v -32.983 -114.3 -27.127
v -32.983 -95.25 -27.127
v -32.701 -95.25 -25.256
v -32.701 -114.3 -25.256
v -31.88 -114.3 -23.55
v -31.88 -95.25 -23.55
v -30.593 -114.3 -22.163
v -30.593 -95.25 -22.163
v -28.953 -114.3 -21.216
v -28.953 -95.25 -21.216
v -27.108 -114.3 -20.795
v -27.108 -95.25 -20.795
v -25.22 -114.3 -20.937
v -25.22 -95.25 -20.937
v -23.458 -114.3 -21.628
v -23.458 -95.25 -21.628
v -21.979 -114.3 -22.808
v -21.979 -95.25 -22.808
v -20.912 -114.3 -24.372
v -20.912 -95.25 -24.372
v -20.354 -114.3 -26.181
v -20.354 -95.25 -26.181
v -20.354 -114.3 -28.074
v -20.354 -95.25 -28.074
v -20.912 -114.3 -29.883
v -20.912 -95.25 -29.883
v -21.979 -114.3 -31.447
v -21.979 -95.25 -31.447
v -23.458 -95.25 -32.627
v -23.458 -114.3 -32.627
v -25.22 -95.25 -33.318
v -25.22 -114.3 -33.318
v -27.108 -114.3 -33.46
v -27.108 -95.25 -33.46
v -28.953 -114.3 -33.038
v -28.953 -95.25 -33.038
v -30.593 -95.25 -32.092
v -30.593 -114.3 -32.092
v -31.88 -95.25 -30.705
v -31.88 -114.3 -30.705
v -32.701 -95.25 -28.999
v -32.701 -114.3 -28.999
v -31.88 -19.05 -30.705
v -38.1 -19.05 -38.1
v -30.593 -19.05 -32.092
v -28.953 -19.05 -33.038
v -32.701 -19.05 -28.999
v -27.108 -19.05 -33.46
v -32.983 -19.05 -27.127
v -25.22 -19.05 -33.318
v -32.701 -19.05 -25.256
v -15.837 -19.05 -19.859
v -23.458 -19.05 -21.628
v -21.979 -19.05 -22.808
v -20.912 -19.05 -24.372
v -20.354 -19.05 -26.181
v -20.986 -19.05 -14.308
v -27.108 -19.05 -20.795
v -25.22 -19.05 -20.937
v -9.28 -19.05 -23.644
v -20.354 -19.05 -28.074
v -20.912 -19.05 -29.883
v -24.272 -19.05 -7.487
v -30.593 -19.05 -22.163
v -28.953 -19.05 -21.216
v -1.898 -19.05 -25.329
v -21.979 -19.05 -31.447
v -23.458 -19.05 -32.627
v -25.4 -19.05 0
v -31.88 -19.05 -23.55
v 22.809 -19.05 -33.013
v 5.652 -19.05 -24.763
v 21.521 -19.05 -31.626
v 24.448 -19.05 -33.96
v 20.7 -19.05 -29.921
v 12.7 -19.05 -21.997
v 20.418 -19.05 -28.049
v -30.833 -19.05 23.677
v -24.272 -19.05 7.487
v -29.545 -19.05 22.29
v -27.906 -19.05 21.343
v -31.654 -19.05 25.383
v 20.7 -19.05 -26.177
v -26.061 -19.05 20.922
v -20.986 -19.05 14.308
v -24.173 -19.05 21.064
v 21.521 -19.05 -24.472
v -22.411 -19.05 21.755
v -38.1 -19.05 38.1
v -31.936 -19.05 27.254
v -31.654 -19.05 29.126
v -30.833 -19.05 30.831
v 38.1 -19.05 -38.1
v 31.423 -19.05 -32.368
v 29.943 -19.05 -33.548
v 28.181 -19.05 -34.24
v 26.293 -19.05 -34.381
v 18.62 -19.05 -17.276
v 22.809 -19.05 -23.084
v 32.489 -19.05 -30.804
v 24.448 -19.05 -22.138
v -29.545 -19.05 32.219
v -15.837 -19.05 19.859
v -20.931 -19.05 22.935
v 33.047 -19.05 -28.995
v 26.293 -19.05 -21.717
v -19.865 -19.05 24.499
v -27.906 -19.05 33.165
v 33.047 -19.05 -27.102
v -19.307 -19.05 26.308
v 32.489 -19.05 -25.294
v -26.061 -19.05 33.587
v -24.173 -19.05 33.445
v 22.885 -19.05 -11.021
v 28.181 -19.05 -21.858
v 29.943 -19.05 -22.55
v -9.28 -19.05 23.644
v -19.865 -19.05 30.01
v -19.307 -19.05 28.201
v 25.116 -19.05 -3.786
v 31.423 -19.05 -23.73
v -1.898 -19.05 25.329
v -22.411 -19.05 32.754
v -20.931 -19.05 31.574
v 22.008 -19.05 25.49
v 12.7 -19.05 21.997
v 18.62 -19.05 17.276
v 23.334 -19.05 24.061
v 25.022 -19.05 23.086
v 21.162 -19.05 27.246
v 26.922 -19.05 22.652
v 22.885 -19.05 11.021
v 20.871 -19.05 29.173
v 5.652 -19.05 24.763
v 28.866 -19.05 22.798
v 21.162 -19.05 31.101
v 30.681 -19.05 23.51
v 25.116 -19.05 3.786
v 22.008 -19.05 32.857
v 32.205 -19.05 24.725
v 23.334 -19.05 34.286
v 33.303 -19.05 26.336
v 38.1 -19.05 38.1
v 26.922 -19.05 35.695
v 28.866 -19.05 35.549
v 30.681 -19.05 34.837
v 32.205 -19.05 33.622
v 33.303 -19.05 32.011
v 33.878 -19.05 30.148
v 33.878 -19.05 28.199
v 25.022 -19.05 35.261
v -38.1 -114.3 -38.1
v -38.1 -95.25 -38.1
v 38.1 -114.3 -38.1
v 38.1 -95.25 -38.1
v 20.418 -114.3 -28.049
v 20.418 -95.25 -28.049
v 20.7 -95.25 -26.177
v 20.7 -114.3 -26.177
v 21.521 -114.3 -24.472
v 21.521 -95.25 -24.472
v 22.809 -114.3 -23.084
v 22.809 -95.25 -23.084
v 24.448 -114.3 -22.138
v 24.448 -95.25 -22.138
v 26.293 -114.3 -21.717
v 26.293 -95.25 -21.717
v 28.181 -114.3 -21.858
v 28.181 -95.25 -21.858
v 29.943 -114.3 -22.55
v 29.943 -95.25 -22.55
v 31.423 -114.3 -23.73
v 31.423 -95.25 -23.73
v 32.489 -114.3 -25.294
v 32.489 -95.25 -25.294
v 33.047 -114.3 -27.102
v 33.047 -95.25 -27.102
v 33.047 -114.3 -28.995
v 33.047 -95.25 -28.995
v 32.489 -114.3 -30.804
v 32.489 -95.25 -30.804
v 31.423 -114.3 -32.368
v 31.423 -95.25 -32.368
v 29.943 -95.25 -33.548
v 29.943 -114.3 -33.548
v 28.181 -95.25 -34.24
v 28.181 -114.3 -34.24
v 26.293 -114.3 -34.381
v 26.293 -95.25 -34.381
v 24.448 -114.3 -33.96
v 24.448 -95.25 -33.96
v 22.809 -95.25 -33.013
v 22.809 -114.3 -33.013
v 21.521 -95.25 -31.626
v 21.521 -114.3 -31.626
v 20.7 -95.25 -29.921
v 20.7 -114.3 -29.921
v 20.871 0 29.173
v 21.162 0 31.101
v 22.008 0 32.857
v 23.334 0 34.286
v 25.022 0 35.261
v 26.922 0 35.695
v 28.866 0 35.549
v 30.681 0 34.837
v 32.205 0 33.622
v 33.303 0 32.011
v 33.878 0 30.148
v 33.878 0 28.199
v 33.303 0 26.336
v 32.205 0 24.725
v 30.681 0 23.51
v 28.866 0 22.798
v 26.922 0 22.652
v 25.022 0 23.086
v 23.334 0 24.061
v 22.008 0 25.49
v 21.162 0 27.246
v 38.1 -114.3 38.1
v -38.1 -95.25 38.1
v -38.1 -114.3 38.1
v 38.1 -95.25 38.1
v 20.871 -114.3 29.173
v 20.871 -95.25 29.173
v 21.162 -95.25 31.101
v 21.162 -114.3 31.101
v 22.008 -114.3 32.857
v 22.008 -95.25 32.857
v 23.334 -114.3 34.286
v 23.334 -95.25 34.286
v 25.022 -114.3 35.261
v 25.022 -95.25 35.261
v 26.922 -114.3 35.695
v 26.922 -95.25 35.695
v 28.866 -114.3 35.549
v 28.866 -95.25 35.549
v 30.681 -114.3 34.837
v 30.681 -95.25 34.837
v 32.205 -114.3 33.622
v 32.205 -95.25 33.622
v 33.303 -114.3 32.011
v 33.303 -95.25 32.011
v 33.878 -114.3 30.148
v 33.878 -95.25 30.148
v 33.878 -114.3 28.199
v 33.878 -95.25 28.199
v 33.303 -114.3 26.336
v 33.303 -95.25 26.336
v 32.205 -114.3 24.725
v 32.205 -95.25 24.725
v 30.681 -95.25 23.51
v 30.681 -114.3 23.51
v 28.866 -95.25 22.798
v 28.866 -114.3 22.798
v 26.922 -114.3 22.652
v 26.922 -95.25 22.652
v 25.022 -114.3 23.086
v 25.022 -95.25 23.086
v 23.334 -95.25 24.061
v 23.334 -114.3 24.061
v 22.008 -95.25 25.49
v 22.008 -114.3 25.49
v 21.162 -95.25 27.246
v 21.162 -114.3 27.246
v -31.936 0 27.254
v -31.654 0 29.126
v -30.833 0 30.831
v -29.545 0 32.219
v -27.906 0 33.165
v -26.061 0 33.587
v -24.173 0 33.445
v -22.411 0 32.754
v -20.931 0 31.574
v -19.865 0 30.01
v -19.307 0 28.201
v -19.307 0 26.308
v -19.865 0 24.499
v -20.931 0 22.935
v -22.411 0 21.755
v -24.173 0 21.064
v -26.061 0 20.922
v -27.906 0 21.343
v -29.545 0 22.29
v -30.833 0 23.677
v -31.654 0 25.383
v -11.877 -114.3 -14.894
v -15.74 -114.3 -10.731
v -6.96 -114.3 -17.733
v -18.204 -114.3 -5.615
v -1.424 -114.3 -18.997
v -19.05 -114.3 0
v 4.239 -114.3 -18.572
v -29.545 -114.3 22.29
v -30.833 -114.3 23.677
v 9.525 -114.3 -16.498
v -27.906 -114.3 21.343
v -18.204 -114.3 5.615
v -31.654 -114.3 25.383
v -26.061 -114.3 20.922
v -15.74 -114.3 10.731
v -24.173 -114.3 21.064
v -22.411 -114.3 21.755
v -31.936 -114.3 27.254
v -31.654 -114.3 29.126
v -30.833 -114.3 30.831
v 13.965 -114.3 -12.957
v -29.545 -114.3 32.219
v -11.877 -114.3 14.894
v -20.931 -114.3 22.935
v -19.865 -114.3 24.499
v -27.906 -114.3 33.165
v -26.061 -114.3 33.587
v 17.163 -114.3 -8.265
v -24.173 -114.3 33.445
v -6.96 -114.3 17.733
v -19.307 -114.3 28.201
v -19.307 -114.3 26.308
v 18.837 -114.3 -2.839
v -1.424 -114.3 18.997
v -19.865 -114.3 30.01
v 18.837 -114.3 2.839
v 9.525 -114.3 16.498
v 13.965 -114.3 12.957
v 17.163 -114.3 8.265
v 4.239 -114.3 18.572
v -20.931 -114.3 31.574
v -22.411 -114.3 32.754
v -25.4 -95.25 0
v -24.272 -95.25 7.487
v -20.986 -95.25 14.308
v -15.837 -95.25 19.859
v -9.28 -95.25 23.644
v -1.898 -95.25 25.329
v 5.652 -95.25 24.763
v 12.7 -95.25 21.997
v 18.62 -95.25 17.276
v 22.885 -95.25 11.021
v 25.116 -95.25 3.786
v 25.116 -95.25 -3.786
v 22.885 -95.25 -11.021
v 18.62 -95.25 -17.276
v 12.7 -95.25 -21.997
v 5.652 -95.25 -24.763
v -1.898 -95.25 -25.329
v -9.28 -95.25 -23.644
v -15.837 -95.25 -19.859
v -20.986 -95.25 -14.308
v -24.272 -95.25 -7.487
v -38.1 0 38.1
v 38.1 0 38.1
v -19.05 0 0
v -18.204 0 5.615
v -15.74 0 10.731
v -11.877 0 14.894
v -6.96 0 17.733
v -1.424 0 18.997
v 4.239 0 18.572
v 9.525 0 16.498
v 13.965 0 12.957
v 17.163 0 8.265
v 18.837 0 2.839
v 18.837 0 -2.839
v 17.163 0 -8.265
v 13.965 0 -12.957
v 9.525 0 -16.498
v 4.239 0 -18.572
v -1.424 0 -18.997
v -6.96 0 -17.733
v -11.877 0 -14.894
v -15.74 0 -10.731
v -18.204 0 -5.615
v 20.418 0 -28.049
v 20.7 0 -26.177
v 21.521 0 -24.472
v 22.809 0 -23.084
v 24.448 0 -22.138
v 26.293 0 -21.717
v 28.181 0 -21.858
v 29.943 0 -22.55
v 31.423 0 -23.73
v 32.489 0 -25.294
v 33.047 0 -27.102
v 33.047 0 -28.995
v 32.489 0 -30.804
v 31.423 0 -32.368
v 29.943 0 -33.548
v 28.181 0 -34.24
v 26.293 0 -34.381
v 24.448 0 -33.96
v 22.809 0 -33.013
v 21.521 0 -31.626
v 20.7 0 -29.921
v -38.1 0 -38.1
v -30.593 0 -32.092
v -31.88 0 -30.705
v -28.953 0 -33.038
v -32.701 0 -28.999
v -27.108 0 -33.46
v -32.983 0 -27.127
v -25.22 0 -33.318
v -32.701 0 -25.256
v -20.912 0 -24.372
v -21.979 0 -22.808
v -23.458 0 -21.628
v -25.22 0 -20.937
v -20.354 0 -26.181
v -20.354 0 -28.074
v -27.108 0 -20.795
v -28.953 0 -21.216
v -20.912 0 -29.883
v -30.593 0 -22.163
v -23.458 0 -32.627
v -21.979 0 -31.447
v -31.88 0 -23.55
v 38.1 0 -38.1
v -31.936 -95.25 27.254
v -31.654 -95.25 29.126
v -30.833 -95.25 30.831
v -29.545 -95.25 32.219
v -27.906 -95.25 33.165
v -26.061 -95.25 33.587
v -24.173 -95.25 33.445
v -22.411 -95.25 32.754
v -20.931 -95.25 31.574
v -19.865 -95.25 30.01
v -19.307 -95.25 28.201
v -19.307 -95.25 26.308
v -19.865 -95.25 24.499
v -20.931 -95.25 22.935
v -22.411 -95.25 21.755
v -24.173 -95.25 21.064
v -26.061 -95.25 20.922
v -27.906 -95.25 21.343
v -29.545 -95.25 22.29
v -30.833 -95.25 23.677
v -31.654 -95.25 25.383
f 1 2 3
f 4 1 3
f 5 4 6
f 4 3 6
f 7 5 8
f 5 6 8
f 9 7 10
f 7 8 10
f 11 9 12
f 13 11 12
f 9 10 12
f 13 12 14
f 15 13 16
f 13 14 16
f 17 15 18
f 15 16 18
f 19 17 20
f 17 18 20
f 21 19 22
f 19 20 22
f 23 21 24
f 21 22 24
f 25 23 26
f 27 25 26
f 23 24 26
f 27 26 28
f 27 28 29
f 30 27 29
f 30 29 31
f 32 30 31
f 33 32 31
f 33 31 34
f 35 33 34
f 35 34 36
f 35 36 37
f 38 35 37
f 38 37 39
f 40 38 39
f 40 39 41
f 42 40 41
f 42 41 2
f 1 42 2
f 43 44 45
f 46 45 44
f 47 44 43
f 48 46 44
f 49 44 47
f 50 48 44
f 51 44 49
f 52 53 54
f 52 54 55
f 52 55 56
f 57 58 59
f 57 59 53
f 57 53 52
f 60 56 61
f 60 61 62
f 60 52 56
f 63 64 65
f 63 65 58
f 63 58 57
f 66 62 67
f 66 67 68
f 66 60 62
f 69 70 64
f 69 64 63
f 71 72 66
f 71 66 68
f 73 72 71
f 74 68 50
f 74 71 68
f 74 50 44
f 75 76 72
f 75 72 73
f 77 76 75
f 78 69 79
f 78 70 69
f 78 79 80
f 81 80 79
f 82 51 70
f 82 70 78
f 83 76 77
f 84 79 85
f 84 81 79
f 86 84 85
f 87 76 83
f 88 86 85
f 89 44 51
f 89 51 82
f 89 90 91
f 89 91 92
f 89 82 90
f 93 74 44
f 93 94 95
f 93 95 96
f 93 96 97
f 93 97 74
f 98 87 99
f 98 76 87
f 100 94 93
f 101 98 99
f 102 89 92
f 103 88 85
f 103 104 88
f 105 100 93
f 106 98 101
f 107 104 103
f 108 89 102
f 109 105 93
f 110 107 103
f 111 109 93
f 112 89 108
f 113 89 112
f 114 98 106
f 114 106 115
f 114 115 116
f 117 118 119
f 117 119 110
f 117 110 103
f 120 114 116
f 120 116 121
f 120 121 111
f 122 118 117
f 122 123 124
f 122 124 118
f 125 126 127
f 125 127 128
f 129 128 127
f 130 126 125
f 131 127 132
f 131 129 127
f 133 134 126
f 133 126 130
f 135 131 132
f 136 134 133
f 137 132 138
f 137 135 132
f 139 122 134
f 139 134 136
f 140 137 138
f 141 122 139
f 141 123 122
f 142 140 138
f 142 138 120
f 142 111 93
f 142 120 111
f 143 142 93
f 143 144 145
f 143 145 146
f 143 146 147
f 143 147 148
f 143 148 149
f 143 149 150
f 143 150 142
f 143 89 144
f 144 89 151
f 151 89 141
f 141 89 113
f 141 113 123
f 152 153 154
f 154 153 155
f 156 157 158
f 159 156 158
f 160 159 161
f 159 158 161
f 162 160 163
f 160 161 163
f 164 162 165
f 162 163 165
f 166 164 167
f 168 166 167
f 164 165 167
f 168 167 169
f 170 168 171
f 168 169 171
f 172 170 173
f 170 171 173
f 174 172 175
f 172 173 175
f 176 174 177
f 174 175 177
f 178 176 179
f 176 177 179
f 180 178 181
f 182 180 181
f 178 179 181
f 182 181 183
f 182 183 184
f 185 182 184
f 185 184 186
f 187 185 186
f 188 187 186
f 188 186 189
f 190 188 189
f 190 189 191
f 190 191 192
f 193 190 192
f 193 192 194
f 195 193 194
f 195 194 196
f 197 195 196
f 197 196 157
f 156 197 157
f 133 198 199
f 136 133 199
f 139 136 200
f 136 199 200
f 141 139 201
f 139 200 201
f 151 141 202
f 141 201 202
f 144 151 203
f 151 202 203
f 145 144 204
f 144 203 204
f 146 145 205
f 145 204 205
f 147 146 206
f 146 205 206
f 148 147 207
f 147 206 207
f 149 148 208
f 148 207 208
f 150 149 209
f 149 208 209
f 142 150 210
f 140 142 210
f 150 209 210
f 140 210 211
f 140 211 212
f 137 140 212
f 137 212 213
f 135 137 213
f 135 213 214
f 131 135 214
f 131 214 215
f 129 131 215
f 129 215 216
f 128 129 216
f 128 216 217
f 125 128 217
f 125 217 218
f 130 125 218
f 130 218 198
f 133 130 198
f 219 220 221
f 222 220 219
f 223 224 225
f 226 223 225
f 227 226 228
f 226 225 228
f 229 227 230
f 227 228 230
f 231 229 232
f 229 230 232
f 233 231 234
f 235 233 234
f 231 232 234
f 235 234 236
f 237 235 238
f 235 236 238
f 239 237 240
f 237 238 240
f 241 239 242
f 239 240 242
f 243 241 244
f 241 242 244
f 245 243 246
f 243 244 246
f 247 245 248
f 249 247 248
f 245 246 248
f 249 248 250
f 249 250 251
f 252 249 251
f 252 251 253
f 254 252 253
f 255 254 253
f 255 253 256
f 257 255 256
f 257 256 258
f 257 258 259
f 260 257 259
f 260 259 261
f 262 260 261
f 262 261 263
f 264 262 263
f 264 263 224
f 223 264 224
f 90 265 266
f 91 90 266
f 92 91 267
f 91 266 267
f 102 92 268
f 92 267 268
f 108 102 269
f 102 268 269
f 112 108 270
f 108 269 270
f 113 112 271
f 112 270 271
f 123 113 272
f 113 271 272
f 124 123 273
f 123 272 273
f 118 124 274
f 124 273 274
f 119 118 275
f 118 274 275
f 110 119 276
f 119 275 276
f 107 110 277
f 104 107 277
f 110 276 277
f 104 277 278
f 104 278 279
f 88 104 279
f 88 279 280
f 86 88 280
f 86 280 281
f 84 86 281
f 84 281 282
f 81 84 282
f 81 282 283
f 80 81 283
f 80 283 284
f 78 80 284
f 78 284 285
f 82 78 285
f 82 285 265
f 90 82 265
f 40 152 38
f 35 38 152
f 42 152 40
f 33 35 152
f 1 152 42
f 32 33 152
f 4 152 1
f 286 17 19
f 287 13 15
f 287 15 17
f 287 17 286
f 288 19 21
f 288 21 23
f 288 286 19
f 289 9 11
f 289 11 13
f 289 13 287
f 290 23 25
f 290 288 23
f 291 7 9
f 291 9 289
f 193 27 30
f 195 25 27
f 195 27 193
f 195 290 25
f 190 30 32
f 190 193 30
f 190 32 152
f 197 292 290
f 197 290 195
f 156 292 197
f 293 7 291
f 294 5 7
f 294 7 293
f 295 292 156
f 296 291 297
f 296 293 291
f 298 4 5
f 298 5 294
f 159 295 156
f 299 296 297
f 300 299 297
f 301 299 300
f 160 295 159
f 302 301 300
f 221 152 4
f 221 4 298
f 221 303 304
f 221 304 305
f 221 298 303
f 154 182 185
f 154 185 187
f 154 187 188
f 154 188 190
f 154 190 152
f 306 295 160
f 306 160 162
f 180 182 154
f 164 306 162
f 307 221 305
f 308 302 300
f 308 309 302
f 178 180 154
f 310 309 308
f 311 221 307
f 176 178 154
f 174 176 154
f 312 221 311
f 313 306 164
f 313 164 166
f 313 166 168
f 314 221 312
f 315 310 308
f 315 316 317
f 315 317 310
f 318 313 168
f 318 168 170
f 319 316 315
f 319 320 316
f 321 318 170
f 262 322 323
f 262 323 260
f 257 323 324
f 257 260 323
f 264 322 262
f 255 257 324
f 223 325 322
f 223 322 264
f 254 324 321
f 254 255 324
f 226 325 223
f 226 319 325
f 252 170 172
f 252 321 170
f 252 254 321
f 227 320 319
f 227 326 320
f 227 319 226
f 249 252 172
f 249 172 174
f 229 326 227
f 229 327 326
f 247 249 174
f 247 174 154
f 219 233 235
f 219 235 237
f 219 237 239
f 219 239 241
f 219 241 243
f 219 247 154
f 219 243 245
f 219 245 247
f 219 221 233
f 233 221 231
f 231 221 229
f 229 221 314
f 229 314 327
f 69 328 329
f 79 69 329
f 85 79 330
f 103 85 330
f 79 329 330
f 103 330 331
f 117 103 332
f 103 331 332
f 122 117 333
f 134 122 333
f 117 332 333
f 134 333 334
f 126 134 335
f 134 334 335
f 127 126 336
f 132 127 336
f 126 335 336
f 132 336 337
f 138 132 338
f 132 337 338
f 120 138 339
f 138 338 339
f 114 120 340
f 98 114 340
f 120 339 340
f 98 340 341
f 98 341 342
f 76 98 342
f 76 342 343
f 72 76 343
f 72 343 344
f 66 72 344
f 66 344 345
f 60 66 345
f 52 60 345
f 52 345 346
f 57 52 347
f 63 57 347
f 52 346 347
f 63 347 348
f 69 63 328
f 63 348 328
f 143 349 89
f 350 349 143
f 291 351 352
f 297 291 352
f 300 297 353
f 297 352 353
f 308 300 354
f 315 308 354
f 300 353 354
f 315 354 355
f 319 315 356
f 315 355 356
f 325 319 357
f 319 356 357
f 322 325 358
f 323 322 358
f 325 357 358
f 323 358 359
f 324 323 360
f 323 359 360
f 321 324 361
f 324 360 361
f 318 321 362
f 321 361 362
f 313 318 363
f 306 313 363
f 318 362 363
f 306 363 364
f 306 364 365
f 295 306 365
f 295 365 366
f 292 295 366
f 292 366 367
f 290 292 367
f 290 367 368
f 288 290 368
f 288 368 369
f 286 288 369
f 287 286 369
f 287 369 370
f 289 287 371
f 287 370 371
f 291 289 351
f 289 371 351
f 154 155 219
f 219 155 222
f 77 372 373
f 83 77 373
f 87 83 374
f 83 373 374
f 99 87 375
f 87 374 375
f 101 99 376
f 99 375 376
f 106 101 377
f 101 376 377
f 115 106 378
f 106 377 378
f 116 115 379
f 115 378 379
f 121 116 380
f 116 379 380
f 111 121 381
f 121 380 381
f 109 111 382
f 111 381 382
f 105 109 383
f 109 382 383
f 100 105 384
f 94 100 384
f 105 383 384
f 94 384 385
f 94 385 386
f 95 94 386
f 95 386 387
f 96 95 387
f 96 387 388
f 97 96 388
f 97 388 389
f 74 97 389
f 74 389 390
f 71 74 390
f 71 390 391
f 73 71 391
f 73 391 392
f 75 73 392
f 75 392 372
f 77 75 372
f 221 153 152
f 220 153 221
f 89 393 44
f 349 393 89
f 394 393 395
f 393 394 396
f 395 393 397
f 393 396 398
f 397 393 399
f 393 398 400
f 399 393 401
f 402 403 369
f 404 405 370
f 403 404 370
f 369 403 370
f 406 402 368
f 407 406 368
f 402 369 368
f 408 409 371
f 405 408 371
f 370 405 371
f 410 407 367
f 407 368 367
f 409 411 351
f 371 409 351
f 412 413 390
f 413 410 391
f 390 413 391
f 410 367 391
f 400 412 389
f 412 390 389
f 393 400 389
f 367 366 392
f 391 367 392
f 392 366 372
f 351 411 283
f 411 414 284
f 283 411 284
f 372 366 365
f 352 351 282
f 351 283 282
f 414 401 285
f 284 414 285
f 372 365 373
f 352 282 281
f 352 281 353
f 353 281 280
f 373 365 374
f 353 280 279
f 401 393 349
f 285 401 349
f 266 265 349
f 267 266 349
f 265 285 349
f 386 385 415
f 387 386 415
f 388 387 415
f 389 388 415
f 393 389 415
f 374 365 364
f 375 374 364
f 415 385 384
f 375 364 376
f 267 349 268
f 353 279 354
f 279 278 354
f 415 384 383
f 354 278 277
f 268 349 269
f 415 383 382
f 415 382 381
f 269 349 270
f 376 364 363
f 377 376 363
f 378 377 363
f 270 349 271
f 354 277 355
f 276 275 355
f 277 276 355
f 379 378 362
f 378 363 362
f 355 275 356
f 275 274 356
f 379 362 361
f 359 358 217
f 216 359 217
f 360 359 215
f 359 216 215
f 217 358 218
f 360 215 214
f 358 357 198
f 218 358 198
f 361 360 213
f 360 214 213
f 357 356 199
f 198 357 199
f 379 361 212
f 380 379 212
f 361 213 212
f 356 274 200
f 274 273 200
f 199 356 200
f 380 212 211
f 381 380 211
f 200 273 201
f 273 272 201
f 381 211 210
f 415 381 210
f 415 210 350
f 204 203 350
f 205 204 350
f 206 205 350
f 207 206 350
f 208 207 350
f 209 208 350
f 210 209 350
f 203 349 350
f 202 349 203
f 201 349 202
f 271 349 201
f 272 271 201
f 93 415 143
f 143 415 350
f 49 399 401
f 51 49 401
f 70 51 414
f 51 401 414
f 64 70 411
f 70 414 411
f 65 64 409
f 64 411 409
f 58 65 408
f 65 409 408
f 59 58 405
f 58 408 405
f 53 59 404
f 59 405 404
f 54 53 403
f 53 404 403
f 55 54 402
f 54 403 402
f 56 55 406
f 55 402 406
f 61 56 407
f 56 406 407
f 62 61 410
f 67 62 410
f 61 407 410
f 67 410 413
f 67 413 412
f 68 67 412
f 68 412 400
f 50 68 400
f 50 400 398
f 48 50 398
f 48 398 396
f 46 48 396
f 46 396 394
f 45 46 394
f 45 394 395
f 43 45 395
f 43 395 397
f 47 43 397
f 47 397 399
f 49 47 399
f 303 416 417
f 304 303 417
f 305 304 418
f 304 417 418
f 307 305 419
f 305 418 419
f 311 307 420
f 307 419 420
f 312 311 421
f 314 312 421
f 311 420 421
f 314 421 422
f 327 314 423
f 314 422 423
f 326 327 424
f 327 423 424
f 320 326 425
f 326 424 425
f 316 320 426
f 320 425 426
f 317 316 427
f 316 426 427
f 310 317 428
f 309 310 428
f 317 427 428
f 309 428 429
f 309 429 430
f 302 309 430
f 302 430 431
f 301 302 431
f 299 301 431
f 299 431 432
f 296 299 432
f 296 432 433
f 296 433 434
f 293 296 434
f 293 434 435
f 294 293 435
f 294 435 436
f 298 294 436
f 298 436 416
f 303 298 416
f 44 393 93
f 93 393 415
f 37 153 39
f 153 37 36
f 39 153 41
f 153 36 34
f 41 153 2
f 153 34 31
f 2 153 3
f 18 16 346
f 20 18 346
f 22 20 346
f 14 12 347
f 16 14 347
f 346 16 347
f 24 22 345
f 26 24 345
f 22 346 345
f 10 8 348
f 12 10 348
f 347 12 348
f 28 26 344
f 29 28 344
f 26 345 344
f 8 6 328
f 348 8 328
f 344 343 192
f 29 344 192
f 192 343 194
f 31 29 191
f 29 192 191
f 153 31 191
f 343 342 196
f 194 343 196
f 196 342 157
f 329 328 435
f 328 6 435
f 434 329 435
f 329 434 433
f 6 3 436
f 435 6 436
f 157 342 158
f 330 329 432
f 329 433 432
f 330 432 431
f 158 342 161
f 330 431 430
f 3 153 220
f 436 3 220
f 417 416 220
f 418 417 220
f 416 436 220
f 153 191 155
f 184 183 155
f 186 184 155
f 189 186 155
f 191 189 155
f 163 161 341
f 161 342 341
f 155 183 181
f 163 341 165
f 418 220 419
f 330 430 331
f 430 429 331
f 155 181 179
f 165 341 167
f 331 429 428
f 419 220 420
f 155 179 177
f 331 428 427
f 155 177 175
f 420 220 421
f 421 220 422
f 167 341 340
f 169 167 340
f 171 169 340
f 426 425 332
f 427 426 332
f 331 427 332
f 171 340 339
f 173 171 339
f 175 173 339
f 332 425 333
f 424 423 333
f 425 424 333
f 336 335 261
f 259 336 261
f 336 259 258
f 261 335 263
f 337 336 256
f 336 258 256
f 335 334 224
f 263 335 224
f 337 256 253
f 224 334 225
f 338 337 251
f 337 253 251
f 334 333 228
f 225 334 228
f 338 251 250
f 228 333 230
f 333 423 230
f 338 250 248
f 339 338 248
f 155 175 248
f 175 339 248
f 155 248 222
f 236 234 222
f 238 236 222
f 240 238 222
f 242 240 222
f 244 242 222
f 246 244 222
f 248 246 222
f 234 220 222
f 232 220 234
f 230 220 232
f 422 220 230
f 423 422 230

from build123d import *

# Parameters (mm, degrees)
F0_W      = 76.2
F0_H      = 76.2
F1_DEPTH  = 19.05
F2_R      = 19.05
F3_DEPTH  = 25.4
F4_R      = 19.05
F5_DEPTH  = 50.8
F6_W      = 76.2
F6_H      = 76.2
F7_DEPTH  = 19.05
F8_R      = 25.4
F9_DEPTH  = 76.2
F10_R     = 19.05
F11_DEPTH = 114.3
F12_R     = 6.35
F14_DEPTH = 114.3
F13_R     = 6.5396642154
F13_R_2   = 6.35
F15_DEPTH = 127


with BuildPart() as f1:
    # F0 (on Front) → F1 (new body)
    with BuildSketch(Plane.XZ):
        Rectangle(F0_W, F0_H)
    extrude(amount=F1_DEPTH)

    # F2 (on face) → F3 (join)
    with BuildSketch(Plane.XZ.offset(19.05)):
        Circle(F2_R)
    extrude(amount=F3_DEPTH)

    # F4 (on face) → F5 (join)
    with BuildSketch(Plane.XZ.offset(44.45)):
        Circle(F4_R)
    extrude(amount=F5_DEPTH)

    # F6 (on face) → F7 (join)
    with BuildSketch(Plane.XZ.offset(95.25)):
        Rectangle(F6_W, F6_H)
    extrude(amount=F7_DEPTH)

    # F8 (on face) → F9 (join)
    with BuildSketch(Plane(origin=(0, -95.25, 0), x_dir=(-1, 0, 0), z_dir=(0, 1, 0))):
        Circle(F8_R)
    extrude(amount=F9_DEPTH)

    # F10 (on face) → F11 (cut)
    with BuildSketch(Plane(origin=(0, 0, 0), x_dir=(-1, 0, 0), z_dir=(0, 1, 0))):
        Circle(F10_R)
    extrude(amount=-F11_DEPTH, mode=Mode.SUBTRACT)

    # F12 (on face) → F14 (cut)
    with BuildSketch(Plane(origin=(0, 0, 0), x_dir=(-1, 0, 0), z_dir=(0, 1, 0))):
        with Locations((25.5859810859, 27.2544045001)):
            Circle(F12_R)
    extrude(amount=-F14_DEPTH, mode=Mode.SUBTRACT)

    # F13 (on face) → F15 (cut)
    with BuildSketch(Plane(origin=(0, 0, 0), x_dir=(-1, 0, 0), z_dir=(0, 1, 0))):
        with Locations((-27.4109728634, 29.1734542698)):
            Circle(F13_R)
        with Locations((-26.7679095268, -28.0488487333)):
            Circle(F13_R_2)
        with Locations((26.6334090033, -27.1274481038)):
            Circle(F13_R_2)
    extrude(amount=-F15_DEPTH, mode=Mode.SUBTRACT)


solid = f1.part
